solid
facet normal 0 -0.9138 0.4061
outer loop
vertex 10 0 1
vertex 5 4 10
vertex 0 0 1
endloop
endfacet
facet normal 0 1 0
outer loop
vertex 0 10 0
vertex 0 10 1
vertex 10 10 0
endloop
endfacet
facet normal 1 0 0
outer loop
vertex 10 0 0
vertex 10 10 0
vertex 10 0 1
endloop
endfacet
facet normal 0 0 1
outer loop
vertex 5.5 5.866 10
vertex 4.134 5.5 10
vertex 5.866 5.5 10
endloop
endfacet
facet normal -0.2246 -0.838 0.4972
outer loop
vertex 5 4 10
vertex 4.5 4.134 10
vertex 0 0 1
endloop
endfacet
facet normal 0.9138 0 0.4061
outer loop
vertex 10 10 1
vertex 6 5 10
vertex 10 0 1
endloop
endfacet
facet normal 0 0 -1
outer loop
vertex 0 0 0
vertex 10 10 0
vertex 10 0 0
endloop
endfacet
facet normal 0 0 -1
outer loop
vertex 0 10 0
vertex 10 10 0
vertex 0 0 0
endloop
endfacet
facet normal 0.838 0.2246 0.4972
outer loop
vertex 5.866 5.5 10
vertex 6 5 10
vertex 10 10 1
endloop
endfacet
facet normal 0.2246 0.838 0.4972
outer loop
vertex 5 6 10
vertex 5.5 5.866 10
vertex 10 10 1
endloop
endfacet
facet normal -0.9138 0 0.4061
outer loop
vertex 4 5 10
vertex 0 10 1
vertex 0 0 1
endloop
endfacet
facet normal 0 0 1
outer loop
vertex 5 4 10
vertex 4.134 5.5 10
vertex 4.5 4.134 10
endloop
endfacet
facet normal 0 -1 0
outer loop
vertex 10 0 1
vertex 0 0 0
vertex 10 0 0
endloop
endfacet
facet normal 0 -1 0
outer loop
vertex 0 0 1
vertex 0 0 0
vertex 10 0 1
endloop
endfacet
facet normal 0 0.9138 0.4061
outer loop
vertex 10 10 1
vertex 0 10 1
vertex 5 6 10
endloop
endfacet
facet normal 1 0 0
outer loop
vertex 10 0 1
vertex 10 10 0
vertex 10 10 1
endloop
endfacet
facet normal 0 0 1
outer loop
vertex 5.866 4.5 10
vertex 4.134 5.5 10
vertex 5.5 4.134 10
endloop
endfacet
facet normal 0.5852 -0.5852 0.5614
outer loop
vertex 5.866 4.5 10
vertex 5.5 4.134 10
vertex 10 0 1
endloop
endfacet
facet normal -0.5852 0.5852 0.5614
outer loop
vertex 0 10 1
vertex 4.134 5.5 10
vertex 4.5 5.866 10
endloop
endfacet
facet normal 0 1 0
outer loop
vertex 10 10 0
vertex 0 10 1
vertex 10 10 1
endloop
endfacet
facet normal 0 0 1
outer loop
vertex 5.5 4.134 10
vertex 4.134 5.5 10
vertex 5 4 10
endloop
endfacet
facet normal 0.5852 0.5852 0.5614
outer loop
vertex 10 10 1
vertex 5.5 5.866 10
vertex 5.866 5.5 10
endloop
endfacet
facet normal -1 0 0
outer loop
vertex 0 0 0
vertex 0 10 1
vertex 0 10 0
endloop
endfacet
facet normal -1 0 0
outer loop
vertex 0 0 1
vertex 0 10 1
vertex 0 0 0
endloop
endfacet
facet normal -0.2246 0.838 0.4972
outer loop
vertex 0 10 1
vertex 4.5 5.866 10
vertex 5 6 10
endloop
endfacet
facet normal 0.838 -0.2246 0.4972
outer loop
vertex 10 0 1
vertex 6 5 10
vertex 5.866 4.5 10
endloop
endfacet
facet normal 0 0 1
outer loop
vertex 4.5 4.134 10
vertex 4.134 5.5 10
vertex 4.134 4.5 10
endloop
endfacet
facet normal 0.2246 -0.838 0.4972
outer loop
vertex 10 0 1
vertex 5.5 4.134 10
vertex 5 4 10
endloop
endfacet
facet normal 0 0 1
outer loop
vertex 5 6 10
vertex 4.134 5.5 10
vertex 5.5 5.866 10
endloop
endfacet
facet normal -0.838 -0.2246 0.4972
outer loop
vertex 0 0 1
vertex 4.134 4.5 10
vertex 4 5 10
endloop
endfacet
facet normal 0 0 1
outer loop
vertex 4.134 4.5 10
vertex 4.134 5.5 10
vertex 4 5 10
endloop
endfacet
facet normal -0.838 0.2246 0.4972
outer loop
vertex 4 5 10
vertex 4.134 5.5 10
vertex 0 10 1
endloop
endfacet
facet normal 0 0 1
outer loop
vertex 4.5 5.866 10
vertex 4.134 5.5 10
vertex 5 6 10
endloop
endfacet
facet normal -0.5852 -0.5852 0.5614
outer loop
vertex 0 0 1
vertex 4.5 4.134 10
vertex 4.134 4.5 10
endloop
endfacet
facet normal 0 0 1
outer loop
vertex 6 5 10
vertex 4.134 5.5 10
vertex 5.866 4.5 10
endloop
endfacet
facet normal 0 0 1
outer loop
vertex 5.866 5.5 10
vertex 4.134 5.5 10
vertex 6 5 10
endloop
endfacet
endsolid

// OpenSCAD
// Generated by scadwright. Do not hand-edit —
// edit the Python source and regenerate.

$fn = 12;

hull() {
    cube([10, 10, 1], center=false);
    translate([5, 5, 0]) {
        cylinder(h=10, r=1, center=false);
    }
}
